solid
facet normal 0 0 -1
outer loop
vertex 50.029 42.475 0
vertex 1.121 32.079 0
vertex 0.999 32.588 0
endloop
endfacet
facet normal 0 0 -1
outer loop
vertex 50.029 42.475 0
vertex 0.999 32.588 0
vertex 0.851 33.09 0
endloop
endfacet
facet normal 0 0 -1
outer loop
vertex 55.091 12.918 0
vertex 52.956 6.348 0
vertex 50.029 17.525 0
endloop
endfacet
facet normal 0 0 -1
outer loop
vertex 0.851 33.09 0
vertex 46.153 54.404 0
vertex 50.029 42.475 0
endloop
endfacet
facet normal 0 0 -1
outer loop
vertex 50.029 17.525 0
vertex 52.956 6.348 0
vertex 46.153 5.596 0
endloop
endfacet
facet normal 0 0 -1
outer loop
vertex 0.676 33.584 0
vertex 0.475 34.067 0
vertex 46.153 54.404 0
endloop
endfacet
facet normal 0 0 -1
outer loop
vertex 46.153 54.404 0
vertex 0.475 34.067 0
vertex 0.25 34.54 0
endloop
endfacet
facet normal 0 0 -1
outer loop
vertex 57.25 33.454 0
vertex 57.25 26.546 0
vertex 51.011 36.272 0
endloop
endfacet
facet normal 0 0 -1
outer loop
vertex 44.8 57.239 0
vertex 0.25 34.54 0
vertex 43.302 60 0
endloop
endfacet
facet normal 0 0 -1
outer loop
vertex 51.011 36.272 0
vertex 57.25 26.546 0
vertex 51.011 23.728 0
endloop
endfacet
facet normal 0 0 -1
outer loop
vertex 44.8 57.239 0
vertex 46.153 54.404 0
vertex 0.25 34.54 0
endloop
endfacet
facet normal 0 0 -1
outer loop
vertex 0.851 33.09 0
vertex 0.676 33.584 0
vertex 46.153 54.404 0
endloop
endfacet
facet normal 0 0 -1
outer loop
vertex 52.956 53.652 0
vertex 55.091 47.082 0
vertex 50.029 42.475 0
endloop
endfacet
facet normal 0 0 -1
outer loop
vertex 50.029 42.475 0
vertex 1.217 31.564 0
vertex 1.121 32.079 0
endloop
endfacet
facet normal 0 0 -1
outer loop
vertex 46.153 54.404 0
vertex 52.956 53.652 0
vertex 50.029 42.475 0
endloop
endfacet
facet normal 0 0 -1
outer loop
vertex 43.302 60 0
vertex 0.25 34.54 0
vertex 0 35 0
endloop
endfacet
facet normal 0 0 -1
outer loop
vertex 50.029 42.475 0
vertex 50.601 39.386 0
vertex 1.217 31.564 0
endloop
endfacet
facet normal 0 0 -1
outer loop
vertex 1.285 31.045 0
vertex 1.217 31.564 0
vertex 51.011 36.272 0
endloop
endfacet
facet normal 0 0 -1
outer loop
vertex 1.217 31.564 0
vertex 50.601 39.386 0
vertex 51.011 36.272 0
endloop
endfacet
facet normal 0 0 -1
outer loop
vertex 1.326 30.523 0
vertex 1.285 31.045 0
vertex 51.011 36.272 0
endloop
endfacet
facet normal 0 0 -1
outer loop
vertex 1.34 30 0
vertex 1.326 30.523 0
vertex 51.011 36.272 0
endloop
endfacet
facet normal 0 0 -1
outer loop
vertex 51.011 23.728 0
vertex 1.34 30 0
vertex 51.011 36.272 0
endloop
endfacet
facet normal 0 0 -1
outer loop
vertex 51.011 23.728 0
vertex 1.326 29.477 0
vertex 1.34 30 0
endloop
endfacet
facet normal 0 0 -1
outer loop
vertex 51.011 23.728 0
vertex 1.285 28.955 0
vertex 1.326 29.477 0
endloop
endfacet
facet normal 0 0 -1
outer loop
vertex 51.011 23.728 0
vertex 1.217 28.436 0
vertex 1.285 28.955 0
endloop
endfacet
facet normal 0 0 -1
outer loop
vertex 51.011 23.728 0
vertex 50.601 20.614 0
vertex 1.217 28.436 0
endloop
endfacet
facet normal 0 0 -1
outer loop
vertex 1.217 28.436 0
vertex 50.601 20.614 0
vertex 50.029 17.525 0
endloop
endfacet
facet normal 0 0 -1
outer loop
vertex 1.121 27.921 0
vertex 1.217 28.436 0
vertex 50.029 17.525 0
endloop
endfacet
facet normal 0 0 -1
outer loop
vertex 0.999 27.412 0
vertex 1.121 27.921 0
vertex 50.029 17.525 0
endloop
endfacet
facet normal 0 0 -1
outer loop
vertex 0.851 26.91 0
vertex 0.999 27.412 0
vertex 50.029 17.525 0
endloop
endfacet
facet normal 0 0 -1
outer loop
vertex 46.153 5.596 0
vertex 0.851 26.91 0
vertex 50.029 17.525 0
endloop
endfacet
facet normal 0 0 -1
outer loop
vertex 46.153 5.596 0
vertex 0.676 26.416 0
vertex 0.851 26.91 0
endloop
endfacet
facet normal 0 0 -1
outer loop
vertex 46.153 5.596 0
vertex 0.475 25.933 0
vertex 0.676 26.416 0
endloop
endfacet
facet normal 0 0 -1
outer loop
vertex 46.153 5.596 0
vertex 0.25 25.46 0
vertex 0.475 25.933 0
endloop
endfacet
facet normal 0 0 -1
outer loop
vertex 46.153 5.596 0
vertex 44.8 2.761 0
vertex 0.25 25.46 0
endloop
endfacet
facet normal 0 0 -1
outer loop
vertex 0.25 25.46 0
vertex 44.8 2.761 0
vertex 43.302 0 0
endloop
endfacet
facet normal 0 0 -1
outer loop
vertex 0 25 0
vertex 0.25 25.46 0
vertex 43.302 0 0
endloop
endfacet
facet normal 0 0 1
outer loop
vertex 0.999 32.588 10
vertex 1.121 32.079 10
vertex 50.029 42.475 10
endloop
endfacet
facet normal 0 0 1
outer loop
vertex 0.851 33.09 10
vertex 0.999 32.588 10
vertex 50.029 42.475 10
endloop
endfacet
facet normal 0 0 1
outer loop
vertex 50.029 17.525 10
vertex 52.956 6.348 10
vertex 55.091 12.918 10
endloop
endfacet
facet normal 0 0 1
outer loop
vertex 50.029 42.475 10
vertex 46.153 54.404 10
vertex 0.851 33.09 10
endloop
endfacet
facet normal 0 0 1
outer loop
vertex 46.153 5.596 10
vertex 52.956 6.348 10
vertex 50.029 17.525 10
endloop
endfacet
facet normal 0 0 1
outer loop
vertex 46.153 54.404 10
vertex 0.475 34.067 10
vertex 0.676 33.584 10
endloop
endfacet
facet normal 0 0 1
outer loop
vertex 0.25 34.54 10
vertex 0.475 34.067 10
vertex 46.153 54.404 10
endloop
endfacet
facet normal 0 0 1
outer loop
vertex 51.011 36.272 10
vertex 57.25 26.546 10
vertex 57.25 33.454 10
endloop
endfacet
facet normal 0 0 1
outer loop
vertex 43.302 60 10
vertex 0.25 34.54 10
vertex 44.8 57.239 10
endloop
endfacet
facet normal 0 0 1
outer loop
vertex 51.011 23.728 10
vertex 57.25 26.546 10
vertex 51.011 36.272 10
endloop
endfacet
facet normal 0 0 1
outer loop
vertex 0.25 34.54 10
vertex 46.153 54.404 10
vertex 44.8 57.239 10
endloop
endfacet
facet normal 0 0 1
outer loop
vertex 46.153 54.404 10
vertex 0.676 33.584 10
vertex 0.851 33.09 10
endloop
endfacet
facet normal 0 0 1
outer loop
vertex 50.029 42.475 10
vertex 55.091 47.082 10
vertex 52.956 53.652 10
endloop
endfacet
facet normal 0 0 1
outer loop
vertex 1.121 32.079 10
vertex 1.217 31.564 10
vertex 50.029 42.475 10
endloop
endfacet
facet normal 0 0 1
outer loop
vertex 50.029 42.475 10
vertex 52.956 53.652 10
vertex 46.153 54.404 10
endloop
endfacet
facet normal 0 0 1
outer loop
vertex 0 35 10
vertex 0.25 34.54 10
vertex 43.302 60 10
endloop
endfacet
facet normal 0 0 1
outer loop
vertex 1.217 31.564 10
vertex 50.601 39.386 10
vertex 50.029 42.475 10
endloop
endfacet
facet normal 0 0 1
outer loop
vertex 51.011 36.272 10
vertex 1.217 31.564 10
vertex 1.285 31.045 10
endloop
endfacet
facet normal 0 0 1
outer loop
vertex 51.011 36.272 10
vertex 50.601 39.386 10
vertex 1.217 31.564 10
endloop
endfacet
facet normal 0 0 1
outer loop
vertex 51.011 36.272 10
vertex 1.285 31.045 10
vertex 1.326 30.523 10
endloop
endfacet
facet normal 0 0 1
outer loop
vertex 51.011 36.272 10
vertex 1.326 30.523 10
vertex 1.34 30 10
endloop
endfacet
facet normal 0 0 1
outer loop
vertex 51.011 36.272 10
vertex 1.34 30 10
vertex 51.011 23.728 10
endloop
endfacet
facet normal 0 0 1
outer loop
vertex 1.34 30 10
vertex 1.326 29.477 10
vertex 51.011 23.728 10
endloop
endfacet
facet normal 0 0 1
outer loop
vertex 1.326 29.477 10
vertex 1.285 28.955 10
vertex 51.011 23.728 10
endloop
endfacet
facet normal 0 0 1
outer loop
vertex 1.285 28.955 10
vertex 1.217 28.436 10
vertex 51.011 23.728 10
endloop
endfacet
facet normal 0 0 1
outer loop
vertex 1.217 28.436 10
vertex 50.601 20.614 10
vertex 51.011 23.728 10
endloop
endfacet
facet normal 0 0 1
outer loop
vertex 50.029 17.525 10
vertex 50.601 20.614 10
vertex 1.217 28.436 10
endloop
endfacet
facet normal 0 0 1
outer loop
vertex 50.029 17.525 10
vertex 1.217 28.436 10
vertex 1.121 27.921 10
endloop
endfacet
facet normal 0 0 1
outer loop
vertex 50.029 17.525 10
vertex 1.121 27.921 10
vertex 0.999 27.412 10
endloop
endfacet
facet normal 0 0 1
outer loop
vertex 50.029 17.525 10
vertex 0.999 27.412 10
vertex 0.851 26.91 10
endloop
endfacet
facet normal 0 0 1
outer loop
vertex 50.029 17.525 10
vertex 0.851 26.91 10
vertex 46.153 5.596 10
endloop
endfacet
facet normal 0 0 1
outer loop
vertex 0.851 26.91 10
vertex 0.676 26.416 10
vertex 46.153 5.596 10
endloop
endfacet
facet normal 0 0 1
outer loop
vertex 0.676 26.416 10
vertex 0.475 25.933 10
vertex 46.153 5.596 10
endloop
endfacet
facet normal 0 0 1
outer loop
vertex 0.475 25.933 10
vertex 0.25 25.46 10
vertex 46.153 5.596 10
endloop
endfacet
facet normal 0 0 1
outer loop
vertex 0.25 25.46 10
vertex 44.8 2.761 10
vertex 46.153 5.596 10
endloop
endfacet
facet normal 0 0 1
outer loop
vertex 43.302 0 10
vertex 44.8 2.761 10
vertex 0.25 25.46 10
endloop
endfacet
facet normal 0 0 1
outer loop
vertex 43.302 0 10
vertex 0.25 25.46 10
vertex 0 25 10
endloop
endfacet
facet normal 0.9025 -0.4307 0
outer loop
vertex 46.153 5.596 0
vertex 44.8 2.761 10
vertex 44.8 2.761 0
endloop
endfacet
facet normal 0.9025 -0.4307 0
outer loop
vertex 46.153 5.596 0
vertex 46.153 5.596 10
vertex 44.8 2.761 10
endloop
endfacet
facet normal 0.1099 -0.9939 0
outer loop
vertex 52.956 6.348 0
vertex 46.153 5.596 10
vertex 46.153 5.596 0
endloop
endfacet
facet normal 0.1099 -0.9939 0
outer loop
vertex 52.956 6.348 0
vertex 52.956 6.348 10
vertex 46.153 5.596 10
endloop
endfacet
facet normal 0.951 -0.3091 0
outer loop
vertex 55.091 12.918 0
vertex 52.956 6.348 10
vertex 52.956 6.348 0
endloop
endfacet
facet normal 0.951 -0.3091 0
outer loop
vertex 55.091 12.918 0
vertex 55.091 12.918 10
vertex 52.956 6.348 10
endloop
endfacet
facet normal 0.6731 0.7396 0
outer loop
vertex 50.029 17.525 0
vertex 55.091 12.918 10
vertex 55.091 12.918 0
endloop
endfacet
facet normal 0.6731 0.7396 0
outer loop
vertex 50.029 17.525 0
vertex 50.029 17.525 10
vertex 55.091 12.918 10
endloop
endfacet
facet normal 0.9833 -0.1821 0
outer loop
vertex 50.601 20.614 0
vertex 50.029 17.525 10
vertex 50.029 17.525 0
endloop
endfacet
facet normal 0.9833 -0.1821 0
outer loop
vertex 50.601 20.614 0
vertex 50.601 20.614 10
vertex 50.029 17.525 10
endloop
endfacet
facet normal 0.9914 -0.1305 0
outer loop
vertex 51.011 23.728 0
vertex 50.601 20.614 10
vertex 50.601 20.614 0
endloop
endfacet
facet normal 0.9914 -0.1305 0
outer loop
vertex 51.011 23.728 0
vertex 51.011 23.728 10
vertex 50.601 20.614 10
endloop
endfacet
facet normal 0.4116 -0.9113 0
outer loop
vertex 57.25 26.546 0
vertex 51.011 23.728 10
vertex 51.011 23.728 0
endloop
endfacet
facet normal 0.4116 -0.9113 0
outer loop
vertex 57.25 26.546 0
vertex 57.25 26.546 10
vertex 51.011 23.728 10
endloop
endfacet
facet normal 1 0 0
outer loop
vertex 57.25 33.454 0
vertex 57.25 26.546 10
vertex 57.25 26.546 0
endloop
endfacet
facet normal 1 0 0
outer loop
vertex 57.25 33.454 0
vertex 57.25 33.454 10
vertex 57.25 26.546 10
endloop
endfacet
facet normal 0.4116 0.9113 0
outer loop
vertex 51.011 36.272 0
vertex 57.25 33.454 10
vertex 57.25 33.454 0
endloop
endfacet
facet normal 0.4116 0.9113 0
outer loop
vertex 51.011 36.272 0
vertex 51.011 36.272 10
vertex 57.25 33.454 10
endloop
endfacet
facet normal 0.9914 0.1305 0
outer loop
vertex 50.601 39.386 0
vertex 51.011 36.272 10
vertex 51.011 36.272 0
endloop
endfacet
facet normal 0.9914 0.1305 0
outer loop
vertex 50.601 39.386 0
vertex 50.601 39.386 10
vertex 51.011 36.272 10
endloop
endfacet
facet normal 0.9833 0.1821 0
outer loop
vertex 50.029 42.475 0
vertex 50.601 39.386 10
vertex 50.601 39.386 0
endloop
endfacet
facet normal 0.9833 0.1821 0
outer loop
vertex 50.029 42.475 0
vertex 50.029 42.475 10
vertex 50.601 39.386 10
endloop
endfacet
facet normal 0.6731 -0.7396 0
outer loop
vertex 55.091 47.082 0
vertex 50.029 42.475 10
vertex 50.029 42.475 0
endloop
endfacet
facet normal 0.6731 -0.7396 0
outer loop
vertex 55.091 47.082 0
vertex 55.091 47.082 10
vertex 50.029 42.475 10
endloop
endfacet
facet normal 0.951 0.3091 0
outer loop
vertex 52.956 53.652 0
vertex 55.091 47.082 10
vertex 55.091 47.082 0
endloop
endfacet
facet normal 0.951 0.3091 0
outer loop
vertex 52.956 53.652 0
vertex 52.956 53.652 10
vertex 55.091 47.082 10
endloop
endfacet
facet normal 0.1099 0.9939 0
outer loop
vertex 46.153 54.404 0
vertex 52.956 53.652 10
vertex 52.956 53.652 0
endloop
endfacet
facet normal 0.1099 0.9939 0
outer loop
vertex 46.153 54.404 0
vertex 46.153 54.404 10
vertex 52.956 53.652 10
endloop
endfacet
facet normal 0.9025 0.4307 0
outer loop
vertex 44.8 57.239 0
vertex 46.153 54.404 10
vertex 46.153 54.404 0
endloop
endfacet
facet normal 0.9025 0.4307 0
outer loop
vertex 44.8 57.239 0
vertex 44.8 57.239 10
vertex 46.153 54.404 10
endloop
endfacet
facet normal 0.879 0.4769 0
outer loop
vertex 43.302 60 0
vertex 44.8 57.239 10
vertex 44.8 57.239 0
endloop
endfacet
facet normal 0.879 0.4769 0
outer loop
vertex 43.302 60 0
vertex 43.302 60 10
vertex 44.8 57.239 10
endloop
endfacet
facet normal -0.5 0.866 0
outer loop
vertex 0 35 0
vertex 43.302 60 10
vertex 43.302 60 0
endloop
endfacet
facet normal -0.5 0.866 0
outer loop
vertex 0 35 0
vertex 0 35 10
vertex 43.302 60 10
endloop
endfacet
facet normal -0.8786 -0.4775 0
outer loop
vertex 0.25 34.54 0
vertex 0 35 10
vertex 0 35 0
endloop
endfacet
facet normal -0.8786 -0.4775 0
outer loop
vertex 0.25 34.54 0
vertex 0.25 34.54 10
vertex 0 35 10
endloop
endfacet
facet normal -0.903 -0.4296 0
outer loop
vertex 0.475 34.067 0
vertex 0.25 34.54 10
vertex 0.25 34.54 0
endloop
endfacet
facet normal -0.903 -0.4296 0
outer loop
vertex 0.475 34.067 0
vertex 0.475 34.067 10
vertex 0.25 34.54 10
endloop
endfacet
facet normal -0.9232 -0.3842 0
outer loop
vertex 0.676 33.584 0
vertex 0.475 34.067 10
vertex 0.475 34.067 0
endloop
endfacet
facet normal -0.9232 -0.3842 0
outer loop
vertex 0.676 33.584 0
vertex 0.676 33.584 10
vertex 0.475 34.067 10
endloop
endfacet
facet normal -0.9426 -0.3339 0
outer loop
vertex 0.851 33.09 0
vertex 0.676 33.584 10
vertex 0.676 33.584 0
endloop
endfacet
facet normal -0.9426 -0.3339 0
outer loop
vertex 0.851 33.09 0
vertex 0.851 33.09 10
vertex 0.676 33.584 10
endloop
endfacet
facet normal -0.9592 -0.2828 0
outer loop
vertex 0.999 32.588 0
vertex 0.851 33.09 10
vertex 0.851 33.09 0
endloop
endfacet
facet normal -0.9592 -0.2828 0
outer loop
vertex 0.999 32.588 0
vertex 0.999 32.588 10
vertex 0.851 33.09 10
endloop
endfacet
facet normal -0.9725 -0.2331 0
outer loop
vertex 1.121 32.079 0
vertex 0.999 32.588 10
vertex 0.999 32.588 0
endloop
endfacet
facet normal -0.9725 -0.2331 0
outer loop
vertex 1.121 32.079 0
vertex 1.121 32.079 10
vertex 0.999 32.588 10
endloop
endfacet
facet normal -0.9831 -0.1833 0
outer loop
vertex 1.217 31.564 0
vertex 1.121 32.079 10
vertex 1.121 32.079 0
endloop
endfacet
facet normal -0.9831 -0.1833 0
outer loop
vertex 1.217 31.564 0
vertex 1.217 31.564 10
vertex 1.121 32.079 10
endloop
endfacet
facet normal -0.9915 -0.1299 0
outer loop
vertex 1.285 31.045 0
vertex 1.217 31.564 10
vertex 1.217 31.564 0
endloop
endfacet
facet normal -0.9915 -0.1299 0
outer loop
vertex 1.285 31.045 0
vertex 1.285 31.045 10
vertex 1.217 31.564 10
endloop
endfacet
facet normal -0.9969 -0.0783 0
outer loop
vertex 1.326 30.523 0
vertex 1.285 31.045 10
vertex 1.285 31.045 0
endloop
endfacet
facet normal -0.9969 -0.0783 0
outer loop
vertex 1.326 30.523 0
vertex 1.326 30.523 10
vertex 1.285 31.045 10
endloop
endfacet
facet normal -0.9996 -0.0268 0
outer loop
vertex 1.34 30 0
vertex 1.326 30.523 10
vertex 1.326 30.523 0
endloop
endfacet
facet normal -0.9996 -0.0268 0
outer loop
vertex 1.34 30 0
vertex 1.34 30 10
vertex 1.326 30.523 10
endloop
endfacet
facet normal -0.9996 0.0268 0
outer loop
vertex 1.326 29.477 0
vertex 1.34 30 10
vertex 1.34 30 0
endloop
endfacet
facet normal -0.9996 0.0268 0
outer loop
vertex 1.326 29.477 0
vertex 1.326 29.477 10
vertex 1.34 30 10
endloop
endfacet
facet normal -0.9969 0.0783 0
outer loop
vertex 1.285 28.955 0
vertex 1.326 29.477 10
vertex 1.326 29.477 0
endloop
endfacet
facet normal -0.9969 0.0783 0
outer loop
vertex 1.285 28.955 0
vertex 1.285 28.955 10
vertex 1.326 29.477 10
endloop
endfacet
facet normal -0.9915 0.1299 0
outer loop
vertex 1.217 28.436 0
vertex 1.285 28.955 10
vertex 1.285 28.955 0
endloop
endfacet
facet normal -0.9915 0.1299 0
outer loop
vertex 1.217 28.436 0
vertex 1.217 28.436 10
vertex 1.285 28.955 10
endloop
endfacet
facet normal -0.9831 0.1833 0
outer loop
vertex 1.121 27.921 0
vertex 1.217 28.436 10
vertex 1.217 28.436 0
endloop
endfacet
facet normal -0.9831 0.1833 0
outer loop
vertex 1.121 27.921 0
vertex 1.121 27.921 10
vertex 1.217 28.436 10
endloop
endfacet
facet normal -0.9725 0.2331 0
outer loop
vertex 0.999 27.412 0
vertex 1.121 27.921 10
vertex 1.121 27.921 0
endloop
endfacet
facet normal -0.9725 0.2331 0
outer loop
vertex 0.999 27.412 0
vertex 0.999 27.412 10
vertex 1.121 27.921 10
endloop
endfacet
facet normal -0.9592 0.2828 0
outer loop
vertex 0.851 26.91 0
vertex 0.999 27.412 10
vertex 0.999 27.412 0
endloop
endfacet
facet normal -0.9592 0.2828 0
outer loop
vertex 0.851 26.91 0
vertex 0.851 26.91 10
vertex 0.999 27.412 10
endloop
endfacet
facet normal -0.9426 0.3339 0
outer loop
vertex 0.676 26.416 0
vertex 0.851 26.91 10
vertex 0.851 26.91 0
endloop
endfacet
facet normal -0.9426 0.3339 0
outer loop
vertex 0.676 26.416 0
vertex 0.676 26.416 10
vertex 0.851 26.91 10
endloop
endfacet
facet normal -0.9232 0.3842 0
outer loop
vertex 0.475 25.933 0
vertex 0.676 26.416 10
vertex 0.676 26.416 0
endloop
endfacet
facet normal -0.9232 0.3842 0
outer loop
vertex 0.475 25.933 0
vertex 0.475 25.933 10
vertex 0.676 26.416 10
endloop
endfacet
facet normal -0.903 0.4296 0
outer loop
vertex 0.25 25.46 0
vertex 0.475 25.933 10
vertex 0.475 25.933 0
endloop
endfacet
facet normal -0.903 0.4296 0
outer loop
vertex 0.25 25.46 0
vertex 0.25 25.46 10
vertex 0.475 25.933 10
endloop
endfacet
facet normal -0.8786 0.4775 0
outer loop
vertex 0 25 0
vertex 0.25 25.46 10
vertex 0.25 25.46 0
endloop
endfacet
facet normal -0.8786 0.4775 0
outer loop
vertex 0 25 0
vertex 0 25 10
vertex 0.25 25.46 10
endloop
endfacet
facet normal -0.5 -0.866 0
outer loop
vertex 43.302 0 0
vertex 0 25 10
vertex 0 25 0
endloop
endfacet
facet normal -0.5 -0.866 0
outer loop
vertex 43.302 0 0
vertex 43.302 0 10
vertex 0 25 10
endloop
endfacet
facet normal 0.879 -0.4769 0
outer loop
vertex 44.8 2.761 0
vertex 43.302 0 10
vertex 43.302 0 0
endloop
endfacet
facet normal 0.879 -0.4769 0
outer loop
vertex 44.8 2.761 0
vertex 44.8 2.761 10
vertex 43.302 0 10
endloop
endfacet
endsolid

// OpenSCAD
$fn = 32;

// ----------------------------------------------------------------------
// Gear sector: 3 teeth on 60 degrees
// ----------------------------------------------------------------------

// --- parameters (mm) ---
sector_angle = 60;        // sector angle, degrees
root_r = 60;              // root circle radius
tooth_h = 6;              // tooth height over the root circle
teeth = 3;                // number of teeth on the sector
hub_r = 10;               // hub bore radius
plate_t = 10;             // sector thickness, Z
arc_step = 3;             // sampling step of the root/hub arcs, degrees

tip_r = root_r + tooth_h;  // tip circle radius

profile = [[43.302, 0], [44.8, 2.761], [46.153, 5.596], [52.956, 6.348], [55.091, 12.918], [50.029, 17.525], [50.601, 20.614], [51.011, 23.728], [57.25, 26.546], [57.25, 33.454], [51.011, 36.272], [50.601, 39.386], [50.029, 42.475], [55.091, 47.082], [52.956, 53.652], [46.153, 54.404], [44.8, 57.239], [43.302, 60], [0, 35], [0.25, 34.54], [0.475, 34.067], [0.676, 33.584], [0.851, 33.09], [0.999, 32.588], [1.121, 32.079], [1.217, 31.564], [1.285, 31.045], [1.326, 30.523], [1.34, 30], [1.326, 29.477], [1.285, 28.955], [1.217, 28.436], [1.121, 27.921], [0.999, 27.412], [0.851, 26.91], [0.676, 26.416], [0.475, 25.933], [0.25, 25.46], [0, 25]];  // primary outline, 39 points, counter clockwise

// --- the one profile operation ---
linear_extrude(height = plate_t) polygon(points = profile);
